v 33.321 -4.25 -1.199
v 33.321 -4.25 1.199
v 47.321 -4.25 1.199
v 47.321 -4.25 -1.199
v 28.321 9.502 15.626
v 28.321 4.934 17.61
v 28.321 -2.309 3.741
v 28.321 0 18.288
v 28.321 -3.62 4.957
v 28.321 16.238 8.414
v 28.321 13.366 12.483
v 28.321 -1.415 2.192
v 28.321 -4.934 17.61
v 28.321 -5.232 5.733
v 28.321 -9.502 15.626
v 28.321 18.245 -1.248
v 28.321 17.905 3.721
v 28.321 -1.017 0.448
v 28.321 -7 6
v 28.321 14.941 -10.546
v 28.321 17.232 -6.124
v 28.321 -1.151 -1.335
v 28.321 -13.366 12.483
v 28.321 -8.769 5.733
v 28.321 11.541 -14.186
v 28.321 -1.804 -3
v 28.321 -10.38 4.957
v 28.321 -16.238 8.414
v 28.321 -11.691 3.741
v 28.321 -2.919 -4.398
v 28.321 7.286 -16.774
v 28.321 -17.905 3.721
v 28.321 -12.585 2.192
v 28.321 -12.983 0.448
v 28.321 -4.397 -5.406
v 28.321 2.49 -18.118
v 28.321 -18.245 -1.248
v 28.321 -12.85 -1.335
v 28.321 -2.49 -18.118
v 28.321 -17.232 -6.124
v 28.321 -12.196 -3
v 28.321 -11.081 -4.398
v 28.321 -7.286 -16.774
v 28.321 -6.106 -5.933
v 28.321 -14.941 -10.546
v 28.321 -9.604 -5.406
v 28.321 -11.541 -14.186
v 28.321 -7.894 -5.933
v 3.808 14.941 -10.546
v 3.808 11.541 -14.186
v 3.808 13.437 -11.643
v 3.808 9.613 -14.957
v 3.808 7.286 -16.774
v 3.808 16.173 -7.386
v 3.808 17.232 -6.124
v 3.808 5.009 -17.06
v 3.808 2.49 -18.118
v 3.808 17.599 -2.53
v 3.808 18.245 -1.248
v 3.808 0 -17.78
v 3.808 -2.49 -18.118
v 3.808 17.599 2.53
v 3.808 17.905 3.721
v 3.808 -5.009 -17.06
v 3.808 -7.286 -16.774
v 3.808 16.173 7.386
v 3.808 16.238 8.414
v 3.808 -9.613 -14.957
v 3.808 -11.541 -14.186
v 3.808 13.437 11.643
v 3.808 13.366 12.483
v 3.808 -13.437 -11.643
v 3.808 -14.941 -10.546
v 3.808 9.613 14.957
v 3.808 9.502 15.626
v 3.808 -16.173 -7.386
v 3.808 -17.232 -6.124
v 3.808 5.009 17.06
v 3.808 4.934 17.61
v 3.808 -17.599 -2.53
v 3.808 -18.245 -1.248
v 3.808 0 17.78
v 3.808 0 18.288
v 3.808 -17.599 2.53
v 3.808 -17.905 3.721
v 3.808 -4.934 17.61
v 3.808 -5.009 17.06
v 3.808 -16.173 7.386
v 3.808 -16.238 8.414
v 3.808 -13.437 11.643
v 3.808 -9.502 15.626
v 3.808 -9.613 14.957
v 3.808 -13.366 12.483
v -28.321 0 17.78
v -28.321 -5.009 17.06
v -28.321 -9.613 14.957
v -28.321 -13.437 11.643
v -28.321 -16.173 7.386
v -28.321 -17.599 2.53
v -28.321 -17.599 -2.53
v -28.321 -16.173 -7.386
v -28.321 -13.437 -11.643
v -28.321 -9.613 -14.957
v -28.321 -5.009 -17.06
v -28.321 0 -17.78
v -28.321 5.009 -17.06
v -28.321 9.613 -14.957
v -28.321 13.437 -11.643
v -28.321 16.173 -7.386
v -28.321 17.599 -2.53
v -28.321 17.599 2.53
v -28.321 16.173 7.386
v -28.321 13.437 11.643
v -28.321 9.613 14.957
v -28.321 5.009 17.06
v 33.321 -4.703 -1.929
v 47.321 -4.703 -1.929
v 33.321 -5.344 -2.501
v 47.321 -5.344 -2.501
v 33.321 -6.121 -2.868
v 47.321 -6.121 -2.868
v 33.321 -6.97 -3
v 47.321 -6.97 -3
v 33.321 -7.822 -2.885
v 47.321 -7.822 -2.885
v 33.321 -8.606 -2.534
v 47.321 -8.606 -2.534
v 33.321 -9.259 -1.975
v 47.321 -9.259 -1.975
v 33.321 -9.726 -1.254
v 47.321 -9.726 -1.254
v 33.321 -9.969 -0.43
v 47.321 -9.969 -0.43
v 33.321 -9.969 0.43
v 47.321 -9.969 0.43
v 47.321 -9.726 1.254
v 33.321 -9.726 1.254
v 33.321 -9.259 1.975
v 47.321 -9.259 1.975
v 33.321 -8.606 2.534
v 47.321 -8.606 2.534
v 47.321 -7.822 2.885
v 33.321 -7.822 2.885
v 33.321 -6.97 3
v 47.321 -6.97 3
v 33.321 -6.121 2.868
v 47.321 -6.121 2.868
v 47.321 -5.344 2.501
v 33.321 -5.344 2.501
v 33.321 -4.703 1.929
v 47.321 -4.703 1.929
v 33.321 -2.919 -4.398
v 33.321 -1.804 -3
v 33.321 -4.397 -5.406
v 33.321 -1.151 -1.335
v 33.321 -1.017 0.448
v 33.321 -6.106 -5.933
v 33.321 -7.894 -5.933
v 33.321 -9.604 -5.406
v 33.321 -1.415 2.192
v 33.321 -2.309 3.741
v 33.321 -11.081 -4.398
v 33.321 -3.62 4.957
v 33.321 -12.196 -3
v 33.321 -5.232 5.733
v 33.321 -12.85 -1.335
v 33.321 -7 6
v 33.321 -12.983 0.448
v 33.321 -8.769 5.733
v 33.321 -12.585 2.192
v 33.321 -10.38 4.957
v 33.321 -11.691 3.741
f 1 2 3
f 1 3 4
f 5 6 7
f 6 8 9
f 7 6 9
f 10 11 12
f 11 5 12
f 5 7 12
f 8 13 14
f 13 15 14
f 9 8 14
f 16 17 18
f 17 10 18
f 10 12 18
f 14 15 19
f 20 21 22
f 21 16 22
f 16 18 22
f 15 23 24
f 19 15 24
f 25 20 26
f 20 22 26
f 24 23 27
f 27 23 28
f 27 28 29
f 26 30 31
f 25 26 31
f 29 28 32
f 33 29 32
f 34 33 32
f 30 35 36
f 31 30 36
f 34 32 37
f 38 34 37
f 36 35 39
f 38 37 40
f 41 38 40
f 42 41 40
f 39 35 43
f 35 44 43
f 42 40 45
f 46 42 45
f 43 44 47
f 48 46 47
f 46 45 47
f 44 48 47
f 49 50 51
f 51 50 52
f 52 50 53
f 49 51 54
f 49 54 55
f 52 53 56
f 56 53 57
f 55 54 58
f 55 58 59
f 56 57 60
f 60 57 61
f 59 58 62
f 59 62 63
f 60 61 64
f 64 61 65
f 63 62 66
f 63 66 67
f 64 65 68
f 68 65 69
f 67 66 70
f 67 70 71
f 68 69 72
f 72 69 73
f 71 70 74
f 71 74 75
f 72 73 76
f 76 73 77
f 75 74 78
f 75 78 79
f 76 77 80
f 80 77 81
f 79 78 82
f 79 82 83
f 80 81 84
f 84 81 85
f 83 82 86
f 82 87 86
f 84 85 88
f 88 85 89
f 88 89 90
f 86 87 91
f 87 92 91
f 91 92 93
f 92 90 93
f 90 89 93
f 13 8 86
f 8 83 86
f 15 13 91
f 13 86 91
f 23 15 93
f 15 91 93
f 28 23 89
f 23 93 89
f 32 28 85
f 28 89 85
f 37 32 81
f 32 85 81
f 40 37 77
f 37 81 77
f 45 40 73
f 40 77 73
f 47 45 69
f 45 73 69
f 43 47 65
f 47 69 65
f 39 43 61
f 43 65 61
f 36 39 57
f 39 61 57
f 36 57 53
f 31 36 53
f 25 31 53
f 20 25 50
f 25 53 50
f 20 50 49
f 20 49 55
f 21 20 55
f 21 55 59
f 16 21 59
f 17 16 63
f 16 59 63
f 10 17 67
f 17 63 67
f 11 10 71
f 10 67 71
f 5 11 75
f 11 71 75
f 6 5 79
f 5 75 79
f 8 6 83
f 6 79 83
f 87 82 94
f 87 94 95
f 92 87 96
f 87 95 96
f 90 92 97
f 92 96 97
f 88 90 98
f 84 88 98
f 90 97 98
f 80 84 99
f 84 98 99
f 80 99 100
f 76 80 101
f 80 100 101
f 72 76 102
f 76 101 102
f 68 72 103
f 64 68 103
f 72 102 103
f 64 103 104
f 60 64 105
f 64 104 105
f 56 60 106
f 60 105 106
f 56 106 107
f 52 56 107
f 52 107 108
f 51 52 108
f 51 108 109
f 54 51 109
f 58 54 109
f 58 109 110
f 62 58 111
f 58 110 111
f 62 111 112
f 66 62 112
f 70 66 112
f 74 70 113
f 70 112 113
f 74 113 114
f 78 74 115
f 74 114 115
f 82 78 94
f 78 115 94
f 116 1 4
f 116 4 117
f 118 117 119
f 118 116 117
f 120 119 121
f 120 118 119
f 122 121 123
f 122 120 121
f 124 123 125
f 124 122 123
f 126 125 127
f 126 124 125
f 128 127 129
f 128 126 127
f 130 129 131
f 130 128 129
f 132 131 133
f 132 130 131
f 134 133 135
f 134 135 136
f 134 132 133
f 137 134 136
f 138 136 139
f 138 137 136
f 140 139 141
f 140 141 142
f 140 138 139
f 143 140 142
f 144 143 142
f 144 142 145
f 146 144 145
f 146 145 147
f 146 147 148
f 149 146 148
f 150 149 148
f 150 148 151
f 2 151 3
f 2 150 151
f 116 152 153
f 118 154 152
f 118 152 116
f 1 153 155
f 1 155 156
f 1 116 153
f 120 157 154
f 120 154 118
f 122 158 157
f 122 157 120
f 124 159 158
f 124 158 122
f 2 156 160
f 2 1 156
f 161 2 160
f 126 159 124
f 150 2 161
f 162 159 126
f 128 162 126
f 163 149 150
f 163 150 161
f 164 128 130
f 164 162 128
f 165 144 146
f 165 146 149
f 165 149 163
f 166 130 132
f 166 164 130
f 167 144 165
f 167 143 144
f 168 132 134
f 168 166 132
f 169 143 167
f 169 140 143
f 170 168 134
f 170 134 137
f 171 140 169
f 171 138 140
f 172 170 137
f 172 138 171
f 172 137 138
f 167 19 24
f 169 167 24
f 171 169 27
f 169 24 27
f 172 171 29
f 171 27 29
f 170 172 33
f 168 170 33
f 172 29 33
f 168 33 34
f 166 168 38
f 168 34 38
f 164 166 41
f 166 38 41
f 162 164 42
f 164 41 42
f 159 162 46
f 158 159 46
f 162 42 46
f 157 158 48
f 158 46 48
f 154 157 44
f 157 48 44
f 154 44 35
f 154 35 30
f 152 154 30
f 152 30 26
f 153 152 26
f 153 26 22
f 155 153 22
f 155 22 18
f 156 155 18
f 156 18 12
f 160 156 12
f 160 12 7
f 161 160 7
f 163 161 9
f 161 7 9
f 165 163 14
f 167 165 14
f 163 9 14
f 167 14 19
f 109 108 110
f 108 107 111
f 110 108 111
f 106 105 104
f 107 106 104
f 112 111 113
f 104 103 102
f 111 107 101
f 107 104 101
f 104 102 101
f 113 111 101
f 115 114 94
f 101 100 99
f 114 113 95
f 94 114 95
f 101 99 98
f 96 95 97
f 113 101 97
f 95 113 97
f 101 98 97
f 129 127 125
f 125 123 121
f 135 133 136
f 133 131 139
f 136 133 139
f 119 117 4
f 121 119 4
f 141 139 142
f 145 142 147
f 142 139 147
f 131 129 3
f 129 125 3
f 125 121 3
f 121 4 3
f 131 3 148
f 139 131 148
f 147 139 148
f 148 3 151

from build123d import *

# Parameters (mm, degrees)
SKETCH2_R           = 6.0000007
BOSS_EXTRUDE1_DEPTH = 4.99999
BOSS_EXTRUDE2_DEPTH = 13.9999974


with BuildPart() as part:
    # Sketch1 → Revolve1 (revolve)
    with BuildSketch(Plane.XY, mode=Mode.PRIVATE) as revolve1_sk:
        Polygon((28.321, 0), (28.321, 18.288), (3.80803947, 18.288), (3.80803947, 17.78), (-28.321, 17.78), (-28.321, 0), align=None)
    revolve(revolve1_sk.sketch.rotate(Axis((-37.449530368, 0, 0), (1, 0, 0)), 90), axis=Axis((-37.449530368, 0, 0), (1, 0, 0)))

    # Sketch2 → Boss-Extrude1 (add)
    with BuildSketch(Plane(origin=(28.321, 0, 0), x_dir=(0, 0, -1), z_dir=(1, 0, 0))):
        with Locations(Location((0, -7.00024, 0), (0, 0, 180))):
            Circle(SKETCH2_R)
    extrude(amount=BOSS_EXTRUDE1_DEPTH)

    # Sketch3 → Boss-Extrude2 (add)
    with BuildSketch(Plane(origin=(33.32099, 0, 0), x_dir=(0, 0, -1), z_dir=(1, 0, 0))):
        with BuildLine():
            Line((-1.198955483, -4.2502455), (1.198955483, -4.2502455))
            ThreePointArc((1.198955483, -4.2502455), (0, -10.000234), (-1.198955483, -4.2502455))
        make_face()
    extrude(amount=BOSS_EXTRUDE2_DEPTH)


solid = part.part
